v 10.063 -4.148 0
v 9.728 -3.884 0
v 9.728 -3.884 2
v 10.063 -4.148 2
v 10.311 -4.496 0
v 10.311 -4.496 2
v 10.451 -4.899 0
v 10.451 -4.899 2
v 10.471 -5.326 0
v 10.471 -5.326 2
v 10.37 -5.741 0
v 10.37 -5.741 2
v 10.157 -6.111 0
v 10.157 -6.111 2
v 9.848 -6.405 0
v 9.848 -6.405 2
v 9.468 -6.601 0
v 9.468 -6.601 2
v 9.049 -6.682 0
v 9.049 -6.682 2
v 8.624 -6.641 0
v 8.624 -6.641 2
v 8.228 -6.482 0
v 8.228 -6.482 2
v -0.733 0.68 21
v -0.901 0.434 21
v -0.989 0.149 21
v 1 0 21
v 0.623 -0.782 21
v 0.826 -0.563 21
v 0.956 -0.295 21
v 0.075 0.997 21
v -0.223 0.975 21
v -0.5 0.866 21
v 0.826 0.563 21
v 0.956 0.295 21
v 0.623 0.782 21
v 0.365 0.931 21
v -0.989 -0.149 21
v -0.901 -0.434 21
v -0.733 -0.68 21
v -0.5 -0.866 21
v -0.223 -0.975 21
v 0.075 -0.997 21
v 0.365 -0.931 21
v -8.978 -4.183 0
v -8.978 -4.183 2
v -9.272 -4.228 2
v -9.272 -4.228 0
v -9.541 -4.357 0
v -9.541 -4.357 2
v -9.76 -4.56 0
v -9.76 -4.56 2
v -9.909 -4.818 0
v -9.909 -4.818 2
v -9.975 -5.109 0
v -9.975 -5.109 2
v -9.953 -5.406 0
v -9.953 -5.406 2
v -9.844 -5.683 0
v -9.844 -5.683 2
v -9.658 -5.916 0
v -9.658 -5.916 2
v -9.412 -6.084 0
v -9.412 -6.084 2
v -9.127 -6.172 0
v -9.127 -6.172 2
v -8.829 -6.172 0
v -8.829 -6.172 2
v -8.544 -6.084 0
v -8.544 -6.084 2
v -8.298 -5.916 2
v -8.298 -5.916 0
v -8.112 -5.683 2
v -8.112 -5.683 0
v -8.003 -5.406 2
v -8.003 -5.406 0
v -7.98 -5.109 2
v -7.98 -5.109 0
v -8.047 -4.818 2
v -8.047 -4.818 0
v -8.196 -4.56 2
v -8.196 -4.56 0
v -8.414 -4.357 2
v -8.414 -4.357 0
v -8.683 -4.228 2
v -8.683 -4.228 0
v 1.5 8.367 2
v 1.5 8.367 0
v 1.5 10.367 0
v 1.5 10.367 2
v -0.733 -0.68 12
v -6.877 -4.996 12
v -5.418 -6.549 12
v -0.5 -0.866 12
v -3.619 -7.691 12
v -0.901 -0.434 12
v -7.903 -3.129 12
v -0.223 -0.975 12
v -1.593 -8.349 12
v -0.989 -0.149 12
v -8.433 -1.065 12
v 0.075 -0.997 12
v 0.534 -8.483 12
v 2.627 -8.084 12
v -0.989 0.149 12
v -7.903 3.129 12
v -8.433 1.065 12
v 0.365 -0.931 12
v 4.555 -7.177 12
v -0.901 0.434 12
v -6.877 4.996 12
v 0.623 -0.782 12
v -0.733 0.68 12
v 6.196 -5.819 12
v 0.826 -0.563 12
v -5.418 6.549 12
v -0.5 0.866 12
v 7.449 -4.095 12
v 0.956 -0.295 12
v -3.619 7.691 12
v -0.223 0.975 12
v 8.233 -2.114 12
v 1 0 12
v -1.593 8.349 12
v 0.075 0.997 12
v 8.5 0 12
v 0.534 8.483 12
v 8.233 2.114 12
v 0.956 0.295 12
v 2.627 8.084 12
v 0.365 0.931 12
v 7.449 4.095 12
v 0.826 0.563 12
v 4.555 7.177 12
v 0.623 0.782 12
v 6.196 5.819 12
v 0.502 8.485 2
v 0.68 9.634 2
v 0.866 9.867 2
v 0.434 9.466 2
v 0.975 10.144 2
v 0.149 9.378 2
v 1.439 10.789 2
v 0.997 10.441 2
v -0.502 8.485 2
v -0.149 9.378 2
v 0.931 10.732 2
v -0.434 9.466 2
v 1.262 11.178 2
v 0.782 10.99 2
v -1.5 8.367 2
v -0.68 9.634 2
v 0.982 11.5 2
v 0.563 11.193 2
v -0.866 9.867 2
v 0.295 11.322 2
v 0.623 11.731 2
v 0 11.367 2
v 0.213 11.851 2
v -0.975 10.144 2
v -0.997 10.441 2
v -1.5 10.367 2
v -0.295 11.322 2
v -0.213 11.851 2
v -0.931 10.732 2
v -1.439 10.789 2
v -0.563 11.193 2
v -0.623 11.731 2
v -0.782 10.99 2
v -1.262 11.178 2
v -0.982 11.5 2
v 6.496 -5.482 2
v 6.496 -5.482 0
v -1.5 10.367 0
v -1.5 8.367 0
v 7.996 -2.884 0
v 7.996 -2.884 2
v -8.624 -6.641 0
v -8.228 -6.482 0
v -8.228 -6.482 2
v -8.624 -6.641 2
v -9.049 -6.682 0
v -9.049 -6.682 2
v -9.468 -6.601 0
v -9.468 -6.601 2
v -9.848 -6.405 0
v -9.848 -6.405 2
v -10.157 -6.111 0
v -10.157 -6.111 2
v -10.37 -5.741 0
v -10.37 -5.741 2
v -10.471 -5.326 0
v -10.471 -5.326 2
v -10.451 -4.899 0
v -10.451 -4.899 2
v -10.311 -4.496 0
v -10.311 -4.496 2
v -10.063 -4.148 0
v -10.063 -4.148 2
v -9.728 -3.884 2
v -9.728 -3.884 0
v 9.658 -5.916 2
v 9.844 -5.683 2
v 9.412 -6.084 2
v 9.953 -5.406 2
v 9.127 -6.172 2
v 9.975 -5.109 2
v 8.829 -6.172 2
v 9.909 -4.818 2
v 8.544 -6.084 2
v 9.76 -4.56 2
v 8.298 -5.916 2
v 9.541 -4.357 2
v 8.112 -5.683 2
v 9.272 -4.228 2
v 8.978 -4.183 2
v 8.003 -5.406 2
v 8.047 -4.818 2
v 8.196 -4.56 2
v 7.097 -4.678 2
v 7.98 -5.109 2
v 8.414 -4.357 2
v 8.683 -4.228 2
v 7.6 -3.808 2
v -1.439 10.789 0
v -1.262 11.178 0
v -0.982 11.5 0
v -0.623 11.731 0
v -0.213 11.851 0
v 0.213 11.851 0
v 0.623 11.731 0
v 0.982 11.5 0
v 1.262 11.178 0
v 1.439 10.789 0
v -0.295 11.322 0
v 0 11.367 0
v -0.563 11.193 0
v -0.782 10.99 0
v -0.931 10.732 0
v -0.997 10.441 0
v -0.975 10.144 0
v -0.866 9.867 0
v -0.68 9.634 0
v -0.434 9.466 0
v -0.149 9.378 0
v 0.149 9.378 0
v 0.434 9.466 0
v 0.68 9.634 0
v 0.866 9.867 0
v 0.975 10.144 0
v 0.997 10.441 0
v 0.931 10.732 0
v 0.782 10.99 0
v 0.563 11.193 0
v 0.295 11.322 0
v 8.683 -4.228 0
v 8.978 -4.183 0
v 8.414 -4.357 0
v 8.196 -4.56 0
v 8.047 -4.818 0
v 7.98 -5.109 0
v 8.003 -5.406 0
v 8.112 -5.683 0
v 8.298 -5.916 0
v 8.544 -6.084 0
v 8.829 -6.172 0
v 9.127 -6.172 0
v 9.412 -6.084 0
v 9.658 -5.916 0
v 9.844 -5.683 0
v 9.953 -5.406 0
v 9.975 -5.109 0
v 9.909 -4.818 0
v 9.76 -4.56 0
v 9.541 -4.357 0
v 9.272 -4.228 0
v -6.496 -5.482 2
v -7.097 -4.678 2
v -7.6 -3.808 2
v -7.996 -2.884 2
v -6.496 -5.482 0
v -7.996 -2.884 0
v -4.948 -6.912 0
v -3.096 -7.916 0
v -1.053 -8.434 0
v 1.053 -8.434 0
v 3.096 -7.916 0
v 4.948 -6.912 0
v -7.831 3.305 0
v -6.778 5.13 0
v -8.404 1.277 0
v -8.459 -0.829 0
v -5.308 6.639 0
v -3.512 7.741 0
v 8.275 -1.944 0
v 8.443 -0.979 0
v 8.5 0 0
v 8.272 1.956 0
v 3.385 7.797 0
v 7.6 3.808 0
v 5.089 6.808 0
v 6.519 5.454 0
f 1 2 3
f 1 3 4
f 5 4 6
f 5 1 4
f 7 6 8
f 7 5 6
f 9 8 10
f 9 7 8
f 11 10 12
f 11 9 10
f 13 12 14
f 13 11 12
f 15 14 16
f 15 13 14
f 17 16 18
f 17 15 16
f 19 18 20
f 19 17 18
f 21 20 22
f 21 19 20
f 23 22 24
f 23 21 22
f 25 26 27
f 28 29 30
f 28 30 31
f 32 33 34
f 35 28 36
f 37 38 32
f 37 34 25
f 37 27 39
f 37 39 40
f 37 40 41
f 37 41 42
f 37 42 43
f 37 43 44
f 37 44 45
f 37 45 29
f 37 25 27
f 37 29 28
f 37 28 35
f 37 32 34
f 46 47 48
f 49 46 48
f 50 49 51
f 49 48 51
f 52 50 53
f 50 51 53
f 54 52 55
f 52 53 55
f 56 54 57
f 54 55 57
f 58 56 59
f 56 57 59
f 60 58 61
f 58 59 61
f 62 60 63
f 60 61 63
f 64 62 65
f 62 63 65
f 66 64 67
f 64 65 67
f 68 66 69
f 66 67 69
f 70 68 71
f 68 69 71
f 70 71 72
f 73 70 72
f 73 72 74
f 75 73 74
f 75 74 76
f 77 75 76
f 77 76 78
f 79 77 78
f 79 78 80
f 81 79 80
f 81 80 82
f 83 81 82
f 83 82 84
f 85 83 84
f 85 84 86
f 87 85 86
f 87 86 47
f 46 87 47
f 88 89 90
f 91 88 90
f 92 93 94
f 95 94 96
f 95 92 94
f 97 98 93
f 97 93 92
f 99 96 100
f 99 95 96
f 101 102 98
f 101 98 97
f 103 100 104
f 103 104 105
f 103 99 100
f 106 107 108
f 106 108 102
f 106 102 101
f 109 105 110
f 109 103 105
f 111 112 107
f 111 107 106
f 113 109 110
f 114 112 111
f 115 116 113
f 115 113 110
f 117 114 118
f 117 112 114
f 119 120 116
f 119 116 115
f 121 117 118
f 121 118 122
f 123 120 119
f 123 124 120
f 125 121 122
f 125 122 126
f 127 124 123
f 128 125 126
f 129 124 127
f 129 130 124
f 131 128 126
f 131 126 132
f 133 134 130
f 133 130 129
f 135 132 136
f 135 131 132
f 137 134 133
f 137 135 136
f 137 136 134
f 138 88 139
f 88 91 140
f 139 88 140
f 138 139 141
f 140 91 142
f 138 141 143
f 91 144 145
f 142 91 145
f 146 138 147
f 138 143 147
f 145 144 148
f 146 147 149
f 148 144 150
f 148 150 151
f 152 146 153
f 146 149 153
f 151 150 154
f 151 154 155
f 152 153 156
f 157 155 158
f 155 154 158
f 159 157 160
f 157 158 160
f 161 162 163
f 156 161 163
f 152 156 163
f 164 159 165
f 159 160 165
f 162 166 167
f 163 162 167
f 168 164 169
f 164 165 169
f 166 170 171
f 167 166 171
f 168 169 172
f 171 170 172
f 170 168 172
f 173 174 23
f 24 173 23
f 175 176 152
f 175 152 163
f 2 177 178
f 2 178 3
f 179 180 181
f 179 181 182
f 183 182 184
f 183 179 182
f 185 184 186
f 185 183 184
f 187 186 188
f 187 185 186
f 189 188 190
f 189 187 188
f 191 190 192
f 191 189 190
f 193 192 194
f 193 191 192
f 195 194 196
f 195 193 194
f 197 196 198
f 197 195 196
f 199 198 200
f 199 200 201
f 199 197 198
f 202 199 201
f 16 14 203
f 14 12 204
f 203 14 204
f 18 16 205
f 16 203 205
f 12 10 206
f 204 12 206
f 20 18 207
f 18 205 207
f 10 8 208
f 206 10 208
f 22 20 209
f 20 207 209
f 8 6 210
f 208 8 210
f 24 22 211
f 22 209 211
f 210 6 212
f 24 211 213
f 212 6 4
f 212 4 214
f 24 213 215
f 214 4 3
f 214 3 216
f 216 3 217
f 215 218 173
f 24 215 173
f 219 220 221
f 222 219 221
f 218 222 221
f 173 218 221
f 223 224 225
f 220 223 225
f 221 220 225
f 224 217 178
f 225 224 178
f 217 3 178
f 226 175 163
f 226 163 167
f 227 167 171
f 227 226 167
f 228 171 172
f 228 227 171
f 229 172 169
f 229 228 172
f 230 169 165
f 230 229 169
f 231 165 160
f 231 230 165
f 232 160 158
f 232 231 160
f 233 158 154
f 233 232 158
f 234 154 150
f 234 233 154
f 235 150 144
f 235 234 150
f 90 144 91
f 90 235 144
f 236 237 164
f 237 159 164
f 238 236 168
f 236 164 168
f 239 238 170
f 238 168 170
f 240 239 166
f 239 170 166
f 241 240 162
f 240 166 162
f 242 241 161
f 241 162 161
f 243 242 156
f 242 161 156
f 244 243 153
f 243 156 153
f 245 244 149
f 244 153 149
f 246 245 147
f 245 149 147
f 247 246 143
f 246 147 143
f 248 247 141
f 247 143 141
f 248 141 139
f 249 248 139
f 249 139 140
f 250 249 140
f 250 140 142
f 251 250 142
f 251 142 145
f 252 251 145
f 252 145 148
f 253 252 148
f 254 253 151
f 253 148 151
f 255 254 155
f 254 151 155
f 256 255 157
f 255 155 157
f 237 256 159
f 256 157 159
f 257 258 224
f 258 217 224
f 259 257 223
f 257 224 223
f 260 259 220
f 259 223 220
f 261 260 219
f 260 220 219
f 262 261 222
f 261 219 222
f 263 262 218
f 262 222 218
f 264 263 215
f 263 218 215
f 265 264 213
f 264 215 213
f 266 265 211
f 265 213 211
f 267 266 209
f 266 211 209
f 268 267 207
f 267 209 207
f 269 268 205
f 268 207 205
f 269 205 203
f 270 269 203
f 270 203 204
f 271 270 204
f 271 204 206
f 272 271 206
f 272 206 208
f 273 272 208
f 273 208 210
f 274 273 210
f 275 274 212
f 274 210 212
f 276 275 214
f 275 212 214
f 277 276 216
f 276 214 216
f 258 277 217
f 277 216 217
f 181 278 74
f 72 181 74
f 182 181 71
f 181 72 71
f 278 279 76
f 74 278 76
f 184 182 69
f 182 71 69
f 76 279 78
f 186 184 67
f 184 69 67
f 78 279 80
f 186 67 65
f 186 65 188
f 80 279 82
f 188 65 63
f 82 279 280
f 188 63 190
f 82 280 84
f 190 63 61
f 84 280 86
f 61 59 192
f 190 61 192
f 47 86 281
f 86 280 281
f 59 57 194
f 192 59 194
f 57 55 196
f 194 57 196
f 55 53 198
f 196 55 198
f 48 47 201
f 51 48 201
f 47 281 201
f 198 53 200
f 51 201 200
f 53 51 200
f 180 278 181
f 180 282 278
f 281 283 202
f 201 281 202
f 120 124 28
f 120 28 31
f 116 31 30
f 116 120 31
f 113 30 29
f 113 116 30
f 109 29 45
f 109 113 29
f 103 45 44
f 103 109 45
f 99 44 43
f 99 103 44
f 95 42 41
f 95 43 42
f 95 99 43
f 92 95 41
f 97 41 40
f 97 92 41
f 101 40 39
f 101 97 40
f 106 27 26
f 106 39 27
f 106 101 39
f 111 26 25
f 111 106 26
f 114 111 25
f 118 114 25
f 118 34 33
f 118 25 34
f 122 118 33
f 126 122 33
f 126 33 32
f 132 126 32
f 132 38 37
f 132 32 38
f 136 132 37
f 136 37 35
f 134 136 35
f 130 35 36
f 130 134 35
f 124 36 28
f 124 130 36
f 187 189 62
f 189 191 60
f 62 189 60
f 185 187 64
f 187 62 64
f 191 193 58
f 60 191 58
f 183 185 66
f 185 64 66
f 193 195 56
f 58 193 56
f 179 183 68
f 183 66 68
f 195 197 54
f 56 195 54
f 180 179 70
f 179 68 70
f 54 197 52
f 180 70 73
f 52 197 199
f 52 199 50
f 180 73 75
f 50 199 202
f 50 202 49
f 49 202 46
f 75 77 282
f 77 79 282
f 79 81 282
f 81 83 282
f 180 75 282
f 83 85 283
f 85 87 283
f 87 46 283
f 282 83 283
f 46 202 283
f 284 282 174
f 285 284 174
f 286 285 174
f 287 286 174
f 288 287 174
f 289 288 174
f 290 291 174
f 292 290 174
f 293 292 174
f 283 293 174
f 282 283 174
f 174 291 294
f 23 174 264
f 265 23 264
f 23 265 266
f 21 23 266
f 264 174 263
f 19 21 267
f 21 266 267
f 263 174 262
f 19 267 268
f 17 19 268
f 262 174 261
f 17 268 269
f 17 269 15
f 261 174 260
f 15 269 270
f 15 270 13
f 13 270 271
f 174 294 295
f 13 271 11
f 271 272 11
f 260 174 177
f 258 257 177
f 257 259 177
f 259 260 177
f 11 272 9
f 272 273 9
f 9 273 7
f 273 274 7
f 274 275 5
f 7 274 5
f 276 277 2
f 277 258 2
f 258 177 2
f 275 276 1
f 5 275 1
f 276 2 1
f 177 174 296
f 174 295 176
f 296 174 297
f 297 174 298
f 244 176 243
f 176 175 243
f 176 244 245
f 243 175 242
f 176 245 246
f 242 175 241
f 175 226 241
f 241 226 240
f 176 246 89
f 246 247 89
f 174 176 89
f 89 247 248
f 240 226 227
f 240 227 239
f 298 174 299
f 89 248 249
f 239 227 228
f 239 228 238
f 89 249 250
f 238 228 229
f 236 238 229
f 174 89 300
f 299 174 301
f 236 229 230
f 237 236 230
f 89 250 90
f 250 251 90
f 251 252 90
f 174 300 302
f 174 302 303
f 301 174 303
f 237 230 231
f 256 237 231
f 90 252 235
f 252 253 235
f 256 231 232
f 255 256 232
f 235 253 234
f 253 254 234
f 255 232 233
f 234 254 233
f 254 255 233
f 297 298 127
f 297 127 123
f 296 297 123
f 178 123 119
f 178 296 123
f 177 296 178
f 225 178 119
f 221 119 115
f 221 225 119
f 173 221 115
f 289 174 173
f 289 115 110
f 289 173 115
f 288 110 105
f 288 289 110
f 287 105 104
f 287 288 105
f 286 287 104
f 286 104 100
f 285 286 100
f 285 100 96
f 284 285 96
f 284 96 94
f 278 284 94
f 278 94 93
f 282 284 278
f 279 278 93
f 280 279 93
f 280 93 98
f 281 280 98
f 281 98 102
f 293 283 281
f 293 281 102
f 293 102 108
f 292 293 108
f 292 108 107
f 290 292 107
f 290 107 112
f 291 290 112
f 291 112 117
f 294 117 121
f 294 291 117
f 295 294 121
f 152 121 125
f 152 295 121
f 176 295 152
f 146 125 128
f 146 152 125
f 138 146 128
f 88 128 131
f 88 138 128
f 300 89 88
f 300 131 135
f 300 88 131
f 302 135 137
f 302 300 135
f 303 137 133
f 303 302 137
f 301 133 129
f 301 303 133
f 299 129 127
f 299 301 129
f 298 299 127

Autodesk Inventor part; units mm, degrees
ref_plane "YZ Plane" through (0, 0, 0) normal (1, 0, 0) x (0, 1, 0)
ref_plane "XZ Plane" through (0, 0, 0) normal (0, 1, 0) x (-1, 0, 0)
ref_plane "XY Plane" through (0, 0, 0) normal (0, 0, 1) x (1, 0, 0)
sketch "Sketch1" plane through (0, 0, 0) normal (0, 0, 1) x (1, 0, 0)
  circle A0 centre (0, 0) radius 8.5
  dimension "d0" = 17
extrude "Extrusion1" add sketch "Sketch1" along normal blind 12
sketch "Sketch2" plane through (0, 0, 0) normal (0, 0, -1) x (-1, 0, 0)
  circle A0 centre (0, 0) radius 8.5 projected
  line L0 (-1.5, 8.3666) -> (-1.5, 10.3666)
  line L1 (1.5, 8.3666) -> (1.5, 10.3666)
  arc A1 (1.5, 10.3666) -> (-1.5, 10.3666) centre (0, 10.3666) ccw
  line L2 (-6.4957, -5.4823) -> (-8.2277, -6.4823)
  line L3 (-7.9957, -2.8843) -> (-9.7277, -3.8843)
  arc A2 (-9.7277, -3.8843) -> (-8.2277, -6.4823) centre (-8.9777, -5.1833) ccw
  line L4 (7.9957, -2.8843) -> (9.7277, -3.8843)
  line L5 (6.4957, -5.4823) -> (8.2277, -6.4823)
  arc A3 (8.2277, -6.4823) -> (9.7277, -3.8843) centre (8.9777, -5.1833) ccw
  arc A4 (-7.9957, -2.8843) -> (-6.4957, -5.4823) centre (0, 0) ccw
  arc A5 (6.4957, -5.4823) -> (7.9957, -2.8843) centre (0, 0) ccw
  dimension "d4" = 2
  dimension "d7" = 360
  dimension "d21" = 1.5
extrude "Extrusion2" add sketch "Sketch2" against normal blind 2 contours A0 L0 A1 L1 | L4 A3 L5 A0 | A0 L2 A2 L3
hole "Hole1" at (-8.9777, -5.1833, 0) at (8.9777, -5.1833, 0) at (0, 10.3666, 0) direction (0, 0, 1) diameter 2 end through all
sketch "Sketch3" plane through (0, 0, 12) normal (0, 0, 1) x (1, 0, 0)
  circle A0 centre (0, 0) radius 1
  dimension "d18" = 2
extrude "Extrusion3" add sketch "Sketch3" along normal blind 9
properties part number "motor_design2" material "Aluminum 6061-AHC"
